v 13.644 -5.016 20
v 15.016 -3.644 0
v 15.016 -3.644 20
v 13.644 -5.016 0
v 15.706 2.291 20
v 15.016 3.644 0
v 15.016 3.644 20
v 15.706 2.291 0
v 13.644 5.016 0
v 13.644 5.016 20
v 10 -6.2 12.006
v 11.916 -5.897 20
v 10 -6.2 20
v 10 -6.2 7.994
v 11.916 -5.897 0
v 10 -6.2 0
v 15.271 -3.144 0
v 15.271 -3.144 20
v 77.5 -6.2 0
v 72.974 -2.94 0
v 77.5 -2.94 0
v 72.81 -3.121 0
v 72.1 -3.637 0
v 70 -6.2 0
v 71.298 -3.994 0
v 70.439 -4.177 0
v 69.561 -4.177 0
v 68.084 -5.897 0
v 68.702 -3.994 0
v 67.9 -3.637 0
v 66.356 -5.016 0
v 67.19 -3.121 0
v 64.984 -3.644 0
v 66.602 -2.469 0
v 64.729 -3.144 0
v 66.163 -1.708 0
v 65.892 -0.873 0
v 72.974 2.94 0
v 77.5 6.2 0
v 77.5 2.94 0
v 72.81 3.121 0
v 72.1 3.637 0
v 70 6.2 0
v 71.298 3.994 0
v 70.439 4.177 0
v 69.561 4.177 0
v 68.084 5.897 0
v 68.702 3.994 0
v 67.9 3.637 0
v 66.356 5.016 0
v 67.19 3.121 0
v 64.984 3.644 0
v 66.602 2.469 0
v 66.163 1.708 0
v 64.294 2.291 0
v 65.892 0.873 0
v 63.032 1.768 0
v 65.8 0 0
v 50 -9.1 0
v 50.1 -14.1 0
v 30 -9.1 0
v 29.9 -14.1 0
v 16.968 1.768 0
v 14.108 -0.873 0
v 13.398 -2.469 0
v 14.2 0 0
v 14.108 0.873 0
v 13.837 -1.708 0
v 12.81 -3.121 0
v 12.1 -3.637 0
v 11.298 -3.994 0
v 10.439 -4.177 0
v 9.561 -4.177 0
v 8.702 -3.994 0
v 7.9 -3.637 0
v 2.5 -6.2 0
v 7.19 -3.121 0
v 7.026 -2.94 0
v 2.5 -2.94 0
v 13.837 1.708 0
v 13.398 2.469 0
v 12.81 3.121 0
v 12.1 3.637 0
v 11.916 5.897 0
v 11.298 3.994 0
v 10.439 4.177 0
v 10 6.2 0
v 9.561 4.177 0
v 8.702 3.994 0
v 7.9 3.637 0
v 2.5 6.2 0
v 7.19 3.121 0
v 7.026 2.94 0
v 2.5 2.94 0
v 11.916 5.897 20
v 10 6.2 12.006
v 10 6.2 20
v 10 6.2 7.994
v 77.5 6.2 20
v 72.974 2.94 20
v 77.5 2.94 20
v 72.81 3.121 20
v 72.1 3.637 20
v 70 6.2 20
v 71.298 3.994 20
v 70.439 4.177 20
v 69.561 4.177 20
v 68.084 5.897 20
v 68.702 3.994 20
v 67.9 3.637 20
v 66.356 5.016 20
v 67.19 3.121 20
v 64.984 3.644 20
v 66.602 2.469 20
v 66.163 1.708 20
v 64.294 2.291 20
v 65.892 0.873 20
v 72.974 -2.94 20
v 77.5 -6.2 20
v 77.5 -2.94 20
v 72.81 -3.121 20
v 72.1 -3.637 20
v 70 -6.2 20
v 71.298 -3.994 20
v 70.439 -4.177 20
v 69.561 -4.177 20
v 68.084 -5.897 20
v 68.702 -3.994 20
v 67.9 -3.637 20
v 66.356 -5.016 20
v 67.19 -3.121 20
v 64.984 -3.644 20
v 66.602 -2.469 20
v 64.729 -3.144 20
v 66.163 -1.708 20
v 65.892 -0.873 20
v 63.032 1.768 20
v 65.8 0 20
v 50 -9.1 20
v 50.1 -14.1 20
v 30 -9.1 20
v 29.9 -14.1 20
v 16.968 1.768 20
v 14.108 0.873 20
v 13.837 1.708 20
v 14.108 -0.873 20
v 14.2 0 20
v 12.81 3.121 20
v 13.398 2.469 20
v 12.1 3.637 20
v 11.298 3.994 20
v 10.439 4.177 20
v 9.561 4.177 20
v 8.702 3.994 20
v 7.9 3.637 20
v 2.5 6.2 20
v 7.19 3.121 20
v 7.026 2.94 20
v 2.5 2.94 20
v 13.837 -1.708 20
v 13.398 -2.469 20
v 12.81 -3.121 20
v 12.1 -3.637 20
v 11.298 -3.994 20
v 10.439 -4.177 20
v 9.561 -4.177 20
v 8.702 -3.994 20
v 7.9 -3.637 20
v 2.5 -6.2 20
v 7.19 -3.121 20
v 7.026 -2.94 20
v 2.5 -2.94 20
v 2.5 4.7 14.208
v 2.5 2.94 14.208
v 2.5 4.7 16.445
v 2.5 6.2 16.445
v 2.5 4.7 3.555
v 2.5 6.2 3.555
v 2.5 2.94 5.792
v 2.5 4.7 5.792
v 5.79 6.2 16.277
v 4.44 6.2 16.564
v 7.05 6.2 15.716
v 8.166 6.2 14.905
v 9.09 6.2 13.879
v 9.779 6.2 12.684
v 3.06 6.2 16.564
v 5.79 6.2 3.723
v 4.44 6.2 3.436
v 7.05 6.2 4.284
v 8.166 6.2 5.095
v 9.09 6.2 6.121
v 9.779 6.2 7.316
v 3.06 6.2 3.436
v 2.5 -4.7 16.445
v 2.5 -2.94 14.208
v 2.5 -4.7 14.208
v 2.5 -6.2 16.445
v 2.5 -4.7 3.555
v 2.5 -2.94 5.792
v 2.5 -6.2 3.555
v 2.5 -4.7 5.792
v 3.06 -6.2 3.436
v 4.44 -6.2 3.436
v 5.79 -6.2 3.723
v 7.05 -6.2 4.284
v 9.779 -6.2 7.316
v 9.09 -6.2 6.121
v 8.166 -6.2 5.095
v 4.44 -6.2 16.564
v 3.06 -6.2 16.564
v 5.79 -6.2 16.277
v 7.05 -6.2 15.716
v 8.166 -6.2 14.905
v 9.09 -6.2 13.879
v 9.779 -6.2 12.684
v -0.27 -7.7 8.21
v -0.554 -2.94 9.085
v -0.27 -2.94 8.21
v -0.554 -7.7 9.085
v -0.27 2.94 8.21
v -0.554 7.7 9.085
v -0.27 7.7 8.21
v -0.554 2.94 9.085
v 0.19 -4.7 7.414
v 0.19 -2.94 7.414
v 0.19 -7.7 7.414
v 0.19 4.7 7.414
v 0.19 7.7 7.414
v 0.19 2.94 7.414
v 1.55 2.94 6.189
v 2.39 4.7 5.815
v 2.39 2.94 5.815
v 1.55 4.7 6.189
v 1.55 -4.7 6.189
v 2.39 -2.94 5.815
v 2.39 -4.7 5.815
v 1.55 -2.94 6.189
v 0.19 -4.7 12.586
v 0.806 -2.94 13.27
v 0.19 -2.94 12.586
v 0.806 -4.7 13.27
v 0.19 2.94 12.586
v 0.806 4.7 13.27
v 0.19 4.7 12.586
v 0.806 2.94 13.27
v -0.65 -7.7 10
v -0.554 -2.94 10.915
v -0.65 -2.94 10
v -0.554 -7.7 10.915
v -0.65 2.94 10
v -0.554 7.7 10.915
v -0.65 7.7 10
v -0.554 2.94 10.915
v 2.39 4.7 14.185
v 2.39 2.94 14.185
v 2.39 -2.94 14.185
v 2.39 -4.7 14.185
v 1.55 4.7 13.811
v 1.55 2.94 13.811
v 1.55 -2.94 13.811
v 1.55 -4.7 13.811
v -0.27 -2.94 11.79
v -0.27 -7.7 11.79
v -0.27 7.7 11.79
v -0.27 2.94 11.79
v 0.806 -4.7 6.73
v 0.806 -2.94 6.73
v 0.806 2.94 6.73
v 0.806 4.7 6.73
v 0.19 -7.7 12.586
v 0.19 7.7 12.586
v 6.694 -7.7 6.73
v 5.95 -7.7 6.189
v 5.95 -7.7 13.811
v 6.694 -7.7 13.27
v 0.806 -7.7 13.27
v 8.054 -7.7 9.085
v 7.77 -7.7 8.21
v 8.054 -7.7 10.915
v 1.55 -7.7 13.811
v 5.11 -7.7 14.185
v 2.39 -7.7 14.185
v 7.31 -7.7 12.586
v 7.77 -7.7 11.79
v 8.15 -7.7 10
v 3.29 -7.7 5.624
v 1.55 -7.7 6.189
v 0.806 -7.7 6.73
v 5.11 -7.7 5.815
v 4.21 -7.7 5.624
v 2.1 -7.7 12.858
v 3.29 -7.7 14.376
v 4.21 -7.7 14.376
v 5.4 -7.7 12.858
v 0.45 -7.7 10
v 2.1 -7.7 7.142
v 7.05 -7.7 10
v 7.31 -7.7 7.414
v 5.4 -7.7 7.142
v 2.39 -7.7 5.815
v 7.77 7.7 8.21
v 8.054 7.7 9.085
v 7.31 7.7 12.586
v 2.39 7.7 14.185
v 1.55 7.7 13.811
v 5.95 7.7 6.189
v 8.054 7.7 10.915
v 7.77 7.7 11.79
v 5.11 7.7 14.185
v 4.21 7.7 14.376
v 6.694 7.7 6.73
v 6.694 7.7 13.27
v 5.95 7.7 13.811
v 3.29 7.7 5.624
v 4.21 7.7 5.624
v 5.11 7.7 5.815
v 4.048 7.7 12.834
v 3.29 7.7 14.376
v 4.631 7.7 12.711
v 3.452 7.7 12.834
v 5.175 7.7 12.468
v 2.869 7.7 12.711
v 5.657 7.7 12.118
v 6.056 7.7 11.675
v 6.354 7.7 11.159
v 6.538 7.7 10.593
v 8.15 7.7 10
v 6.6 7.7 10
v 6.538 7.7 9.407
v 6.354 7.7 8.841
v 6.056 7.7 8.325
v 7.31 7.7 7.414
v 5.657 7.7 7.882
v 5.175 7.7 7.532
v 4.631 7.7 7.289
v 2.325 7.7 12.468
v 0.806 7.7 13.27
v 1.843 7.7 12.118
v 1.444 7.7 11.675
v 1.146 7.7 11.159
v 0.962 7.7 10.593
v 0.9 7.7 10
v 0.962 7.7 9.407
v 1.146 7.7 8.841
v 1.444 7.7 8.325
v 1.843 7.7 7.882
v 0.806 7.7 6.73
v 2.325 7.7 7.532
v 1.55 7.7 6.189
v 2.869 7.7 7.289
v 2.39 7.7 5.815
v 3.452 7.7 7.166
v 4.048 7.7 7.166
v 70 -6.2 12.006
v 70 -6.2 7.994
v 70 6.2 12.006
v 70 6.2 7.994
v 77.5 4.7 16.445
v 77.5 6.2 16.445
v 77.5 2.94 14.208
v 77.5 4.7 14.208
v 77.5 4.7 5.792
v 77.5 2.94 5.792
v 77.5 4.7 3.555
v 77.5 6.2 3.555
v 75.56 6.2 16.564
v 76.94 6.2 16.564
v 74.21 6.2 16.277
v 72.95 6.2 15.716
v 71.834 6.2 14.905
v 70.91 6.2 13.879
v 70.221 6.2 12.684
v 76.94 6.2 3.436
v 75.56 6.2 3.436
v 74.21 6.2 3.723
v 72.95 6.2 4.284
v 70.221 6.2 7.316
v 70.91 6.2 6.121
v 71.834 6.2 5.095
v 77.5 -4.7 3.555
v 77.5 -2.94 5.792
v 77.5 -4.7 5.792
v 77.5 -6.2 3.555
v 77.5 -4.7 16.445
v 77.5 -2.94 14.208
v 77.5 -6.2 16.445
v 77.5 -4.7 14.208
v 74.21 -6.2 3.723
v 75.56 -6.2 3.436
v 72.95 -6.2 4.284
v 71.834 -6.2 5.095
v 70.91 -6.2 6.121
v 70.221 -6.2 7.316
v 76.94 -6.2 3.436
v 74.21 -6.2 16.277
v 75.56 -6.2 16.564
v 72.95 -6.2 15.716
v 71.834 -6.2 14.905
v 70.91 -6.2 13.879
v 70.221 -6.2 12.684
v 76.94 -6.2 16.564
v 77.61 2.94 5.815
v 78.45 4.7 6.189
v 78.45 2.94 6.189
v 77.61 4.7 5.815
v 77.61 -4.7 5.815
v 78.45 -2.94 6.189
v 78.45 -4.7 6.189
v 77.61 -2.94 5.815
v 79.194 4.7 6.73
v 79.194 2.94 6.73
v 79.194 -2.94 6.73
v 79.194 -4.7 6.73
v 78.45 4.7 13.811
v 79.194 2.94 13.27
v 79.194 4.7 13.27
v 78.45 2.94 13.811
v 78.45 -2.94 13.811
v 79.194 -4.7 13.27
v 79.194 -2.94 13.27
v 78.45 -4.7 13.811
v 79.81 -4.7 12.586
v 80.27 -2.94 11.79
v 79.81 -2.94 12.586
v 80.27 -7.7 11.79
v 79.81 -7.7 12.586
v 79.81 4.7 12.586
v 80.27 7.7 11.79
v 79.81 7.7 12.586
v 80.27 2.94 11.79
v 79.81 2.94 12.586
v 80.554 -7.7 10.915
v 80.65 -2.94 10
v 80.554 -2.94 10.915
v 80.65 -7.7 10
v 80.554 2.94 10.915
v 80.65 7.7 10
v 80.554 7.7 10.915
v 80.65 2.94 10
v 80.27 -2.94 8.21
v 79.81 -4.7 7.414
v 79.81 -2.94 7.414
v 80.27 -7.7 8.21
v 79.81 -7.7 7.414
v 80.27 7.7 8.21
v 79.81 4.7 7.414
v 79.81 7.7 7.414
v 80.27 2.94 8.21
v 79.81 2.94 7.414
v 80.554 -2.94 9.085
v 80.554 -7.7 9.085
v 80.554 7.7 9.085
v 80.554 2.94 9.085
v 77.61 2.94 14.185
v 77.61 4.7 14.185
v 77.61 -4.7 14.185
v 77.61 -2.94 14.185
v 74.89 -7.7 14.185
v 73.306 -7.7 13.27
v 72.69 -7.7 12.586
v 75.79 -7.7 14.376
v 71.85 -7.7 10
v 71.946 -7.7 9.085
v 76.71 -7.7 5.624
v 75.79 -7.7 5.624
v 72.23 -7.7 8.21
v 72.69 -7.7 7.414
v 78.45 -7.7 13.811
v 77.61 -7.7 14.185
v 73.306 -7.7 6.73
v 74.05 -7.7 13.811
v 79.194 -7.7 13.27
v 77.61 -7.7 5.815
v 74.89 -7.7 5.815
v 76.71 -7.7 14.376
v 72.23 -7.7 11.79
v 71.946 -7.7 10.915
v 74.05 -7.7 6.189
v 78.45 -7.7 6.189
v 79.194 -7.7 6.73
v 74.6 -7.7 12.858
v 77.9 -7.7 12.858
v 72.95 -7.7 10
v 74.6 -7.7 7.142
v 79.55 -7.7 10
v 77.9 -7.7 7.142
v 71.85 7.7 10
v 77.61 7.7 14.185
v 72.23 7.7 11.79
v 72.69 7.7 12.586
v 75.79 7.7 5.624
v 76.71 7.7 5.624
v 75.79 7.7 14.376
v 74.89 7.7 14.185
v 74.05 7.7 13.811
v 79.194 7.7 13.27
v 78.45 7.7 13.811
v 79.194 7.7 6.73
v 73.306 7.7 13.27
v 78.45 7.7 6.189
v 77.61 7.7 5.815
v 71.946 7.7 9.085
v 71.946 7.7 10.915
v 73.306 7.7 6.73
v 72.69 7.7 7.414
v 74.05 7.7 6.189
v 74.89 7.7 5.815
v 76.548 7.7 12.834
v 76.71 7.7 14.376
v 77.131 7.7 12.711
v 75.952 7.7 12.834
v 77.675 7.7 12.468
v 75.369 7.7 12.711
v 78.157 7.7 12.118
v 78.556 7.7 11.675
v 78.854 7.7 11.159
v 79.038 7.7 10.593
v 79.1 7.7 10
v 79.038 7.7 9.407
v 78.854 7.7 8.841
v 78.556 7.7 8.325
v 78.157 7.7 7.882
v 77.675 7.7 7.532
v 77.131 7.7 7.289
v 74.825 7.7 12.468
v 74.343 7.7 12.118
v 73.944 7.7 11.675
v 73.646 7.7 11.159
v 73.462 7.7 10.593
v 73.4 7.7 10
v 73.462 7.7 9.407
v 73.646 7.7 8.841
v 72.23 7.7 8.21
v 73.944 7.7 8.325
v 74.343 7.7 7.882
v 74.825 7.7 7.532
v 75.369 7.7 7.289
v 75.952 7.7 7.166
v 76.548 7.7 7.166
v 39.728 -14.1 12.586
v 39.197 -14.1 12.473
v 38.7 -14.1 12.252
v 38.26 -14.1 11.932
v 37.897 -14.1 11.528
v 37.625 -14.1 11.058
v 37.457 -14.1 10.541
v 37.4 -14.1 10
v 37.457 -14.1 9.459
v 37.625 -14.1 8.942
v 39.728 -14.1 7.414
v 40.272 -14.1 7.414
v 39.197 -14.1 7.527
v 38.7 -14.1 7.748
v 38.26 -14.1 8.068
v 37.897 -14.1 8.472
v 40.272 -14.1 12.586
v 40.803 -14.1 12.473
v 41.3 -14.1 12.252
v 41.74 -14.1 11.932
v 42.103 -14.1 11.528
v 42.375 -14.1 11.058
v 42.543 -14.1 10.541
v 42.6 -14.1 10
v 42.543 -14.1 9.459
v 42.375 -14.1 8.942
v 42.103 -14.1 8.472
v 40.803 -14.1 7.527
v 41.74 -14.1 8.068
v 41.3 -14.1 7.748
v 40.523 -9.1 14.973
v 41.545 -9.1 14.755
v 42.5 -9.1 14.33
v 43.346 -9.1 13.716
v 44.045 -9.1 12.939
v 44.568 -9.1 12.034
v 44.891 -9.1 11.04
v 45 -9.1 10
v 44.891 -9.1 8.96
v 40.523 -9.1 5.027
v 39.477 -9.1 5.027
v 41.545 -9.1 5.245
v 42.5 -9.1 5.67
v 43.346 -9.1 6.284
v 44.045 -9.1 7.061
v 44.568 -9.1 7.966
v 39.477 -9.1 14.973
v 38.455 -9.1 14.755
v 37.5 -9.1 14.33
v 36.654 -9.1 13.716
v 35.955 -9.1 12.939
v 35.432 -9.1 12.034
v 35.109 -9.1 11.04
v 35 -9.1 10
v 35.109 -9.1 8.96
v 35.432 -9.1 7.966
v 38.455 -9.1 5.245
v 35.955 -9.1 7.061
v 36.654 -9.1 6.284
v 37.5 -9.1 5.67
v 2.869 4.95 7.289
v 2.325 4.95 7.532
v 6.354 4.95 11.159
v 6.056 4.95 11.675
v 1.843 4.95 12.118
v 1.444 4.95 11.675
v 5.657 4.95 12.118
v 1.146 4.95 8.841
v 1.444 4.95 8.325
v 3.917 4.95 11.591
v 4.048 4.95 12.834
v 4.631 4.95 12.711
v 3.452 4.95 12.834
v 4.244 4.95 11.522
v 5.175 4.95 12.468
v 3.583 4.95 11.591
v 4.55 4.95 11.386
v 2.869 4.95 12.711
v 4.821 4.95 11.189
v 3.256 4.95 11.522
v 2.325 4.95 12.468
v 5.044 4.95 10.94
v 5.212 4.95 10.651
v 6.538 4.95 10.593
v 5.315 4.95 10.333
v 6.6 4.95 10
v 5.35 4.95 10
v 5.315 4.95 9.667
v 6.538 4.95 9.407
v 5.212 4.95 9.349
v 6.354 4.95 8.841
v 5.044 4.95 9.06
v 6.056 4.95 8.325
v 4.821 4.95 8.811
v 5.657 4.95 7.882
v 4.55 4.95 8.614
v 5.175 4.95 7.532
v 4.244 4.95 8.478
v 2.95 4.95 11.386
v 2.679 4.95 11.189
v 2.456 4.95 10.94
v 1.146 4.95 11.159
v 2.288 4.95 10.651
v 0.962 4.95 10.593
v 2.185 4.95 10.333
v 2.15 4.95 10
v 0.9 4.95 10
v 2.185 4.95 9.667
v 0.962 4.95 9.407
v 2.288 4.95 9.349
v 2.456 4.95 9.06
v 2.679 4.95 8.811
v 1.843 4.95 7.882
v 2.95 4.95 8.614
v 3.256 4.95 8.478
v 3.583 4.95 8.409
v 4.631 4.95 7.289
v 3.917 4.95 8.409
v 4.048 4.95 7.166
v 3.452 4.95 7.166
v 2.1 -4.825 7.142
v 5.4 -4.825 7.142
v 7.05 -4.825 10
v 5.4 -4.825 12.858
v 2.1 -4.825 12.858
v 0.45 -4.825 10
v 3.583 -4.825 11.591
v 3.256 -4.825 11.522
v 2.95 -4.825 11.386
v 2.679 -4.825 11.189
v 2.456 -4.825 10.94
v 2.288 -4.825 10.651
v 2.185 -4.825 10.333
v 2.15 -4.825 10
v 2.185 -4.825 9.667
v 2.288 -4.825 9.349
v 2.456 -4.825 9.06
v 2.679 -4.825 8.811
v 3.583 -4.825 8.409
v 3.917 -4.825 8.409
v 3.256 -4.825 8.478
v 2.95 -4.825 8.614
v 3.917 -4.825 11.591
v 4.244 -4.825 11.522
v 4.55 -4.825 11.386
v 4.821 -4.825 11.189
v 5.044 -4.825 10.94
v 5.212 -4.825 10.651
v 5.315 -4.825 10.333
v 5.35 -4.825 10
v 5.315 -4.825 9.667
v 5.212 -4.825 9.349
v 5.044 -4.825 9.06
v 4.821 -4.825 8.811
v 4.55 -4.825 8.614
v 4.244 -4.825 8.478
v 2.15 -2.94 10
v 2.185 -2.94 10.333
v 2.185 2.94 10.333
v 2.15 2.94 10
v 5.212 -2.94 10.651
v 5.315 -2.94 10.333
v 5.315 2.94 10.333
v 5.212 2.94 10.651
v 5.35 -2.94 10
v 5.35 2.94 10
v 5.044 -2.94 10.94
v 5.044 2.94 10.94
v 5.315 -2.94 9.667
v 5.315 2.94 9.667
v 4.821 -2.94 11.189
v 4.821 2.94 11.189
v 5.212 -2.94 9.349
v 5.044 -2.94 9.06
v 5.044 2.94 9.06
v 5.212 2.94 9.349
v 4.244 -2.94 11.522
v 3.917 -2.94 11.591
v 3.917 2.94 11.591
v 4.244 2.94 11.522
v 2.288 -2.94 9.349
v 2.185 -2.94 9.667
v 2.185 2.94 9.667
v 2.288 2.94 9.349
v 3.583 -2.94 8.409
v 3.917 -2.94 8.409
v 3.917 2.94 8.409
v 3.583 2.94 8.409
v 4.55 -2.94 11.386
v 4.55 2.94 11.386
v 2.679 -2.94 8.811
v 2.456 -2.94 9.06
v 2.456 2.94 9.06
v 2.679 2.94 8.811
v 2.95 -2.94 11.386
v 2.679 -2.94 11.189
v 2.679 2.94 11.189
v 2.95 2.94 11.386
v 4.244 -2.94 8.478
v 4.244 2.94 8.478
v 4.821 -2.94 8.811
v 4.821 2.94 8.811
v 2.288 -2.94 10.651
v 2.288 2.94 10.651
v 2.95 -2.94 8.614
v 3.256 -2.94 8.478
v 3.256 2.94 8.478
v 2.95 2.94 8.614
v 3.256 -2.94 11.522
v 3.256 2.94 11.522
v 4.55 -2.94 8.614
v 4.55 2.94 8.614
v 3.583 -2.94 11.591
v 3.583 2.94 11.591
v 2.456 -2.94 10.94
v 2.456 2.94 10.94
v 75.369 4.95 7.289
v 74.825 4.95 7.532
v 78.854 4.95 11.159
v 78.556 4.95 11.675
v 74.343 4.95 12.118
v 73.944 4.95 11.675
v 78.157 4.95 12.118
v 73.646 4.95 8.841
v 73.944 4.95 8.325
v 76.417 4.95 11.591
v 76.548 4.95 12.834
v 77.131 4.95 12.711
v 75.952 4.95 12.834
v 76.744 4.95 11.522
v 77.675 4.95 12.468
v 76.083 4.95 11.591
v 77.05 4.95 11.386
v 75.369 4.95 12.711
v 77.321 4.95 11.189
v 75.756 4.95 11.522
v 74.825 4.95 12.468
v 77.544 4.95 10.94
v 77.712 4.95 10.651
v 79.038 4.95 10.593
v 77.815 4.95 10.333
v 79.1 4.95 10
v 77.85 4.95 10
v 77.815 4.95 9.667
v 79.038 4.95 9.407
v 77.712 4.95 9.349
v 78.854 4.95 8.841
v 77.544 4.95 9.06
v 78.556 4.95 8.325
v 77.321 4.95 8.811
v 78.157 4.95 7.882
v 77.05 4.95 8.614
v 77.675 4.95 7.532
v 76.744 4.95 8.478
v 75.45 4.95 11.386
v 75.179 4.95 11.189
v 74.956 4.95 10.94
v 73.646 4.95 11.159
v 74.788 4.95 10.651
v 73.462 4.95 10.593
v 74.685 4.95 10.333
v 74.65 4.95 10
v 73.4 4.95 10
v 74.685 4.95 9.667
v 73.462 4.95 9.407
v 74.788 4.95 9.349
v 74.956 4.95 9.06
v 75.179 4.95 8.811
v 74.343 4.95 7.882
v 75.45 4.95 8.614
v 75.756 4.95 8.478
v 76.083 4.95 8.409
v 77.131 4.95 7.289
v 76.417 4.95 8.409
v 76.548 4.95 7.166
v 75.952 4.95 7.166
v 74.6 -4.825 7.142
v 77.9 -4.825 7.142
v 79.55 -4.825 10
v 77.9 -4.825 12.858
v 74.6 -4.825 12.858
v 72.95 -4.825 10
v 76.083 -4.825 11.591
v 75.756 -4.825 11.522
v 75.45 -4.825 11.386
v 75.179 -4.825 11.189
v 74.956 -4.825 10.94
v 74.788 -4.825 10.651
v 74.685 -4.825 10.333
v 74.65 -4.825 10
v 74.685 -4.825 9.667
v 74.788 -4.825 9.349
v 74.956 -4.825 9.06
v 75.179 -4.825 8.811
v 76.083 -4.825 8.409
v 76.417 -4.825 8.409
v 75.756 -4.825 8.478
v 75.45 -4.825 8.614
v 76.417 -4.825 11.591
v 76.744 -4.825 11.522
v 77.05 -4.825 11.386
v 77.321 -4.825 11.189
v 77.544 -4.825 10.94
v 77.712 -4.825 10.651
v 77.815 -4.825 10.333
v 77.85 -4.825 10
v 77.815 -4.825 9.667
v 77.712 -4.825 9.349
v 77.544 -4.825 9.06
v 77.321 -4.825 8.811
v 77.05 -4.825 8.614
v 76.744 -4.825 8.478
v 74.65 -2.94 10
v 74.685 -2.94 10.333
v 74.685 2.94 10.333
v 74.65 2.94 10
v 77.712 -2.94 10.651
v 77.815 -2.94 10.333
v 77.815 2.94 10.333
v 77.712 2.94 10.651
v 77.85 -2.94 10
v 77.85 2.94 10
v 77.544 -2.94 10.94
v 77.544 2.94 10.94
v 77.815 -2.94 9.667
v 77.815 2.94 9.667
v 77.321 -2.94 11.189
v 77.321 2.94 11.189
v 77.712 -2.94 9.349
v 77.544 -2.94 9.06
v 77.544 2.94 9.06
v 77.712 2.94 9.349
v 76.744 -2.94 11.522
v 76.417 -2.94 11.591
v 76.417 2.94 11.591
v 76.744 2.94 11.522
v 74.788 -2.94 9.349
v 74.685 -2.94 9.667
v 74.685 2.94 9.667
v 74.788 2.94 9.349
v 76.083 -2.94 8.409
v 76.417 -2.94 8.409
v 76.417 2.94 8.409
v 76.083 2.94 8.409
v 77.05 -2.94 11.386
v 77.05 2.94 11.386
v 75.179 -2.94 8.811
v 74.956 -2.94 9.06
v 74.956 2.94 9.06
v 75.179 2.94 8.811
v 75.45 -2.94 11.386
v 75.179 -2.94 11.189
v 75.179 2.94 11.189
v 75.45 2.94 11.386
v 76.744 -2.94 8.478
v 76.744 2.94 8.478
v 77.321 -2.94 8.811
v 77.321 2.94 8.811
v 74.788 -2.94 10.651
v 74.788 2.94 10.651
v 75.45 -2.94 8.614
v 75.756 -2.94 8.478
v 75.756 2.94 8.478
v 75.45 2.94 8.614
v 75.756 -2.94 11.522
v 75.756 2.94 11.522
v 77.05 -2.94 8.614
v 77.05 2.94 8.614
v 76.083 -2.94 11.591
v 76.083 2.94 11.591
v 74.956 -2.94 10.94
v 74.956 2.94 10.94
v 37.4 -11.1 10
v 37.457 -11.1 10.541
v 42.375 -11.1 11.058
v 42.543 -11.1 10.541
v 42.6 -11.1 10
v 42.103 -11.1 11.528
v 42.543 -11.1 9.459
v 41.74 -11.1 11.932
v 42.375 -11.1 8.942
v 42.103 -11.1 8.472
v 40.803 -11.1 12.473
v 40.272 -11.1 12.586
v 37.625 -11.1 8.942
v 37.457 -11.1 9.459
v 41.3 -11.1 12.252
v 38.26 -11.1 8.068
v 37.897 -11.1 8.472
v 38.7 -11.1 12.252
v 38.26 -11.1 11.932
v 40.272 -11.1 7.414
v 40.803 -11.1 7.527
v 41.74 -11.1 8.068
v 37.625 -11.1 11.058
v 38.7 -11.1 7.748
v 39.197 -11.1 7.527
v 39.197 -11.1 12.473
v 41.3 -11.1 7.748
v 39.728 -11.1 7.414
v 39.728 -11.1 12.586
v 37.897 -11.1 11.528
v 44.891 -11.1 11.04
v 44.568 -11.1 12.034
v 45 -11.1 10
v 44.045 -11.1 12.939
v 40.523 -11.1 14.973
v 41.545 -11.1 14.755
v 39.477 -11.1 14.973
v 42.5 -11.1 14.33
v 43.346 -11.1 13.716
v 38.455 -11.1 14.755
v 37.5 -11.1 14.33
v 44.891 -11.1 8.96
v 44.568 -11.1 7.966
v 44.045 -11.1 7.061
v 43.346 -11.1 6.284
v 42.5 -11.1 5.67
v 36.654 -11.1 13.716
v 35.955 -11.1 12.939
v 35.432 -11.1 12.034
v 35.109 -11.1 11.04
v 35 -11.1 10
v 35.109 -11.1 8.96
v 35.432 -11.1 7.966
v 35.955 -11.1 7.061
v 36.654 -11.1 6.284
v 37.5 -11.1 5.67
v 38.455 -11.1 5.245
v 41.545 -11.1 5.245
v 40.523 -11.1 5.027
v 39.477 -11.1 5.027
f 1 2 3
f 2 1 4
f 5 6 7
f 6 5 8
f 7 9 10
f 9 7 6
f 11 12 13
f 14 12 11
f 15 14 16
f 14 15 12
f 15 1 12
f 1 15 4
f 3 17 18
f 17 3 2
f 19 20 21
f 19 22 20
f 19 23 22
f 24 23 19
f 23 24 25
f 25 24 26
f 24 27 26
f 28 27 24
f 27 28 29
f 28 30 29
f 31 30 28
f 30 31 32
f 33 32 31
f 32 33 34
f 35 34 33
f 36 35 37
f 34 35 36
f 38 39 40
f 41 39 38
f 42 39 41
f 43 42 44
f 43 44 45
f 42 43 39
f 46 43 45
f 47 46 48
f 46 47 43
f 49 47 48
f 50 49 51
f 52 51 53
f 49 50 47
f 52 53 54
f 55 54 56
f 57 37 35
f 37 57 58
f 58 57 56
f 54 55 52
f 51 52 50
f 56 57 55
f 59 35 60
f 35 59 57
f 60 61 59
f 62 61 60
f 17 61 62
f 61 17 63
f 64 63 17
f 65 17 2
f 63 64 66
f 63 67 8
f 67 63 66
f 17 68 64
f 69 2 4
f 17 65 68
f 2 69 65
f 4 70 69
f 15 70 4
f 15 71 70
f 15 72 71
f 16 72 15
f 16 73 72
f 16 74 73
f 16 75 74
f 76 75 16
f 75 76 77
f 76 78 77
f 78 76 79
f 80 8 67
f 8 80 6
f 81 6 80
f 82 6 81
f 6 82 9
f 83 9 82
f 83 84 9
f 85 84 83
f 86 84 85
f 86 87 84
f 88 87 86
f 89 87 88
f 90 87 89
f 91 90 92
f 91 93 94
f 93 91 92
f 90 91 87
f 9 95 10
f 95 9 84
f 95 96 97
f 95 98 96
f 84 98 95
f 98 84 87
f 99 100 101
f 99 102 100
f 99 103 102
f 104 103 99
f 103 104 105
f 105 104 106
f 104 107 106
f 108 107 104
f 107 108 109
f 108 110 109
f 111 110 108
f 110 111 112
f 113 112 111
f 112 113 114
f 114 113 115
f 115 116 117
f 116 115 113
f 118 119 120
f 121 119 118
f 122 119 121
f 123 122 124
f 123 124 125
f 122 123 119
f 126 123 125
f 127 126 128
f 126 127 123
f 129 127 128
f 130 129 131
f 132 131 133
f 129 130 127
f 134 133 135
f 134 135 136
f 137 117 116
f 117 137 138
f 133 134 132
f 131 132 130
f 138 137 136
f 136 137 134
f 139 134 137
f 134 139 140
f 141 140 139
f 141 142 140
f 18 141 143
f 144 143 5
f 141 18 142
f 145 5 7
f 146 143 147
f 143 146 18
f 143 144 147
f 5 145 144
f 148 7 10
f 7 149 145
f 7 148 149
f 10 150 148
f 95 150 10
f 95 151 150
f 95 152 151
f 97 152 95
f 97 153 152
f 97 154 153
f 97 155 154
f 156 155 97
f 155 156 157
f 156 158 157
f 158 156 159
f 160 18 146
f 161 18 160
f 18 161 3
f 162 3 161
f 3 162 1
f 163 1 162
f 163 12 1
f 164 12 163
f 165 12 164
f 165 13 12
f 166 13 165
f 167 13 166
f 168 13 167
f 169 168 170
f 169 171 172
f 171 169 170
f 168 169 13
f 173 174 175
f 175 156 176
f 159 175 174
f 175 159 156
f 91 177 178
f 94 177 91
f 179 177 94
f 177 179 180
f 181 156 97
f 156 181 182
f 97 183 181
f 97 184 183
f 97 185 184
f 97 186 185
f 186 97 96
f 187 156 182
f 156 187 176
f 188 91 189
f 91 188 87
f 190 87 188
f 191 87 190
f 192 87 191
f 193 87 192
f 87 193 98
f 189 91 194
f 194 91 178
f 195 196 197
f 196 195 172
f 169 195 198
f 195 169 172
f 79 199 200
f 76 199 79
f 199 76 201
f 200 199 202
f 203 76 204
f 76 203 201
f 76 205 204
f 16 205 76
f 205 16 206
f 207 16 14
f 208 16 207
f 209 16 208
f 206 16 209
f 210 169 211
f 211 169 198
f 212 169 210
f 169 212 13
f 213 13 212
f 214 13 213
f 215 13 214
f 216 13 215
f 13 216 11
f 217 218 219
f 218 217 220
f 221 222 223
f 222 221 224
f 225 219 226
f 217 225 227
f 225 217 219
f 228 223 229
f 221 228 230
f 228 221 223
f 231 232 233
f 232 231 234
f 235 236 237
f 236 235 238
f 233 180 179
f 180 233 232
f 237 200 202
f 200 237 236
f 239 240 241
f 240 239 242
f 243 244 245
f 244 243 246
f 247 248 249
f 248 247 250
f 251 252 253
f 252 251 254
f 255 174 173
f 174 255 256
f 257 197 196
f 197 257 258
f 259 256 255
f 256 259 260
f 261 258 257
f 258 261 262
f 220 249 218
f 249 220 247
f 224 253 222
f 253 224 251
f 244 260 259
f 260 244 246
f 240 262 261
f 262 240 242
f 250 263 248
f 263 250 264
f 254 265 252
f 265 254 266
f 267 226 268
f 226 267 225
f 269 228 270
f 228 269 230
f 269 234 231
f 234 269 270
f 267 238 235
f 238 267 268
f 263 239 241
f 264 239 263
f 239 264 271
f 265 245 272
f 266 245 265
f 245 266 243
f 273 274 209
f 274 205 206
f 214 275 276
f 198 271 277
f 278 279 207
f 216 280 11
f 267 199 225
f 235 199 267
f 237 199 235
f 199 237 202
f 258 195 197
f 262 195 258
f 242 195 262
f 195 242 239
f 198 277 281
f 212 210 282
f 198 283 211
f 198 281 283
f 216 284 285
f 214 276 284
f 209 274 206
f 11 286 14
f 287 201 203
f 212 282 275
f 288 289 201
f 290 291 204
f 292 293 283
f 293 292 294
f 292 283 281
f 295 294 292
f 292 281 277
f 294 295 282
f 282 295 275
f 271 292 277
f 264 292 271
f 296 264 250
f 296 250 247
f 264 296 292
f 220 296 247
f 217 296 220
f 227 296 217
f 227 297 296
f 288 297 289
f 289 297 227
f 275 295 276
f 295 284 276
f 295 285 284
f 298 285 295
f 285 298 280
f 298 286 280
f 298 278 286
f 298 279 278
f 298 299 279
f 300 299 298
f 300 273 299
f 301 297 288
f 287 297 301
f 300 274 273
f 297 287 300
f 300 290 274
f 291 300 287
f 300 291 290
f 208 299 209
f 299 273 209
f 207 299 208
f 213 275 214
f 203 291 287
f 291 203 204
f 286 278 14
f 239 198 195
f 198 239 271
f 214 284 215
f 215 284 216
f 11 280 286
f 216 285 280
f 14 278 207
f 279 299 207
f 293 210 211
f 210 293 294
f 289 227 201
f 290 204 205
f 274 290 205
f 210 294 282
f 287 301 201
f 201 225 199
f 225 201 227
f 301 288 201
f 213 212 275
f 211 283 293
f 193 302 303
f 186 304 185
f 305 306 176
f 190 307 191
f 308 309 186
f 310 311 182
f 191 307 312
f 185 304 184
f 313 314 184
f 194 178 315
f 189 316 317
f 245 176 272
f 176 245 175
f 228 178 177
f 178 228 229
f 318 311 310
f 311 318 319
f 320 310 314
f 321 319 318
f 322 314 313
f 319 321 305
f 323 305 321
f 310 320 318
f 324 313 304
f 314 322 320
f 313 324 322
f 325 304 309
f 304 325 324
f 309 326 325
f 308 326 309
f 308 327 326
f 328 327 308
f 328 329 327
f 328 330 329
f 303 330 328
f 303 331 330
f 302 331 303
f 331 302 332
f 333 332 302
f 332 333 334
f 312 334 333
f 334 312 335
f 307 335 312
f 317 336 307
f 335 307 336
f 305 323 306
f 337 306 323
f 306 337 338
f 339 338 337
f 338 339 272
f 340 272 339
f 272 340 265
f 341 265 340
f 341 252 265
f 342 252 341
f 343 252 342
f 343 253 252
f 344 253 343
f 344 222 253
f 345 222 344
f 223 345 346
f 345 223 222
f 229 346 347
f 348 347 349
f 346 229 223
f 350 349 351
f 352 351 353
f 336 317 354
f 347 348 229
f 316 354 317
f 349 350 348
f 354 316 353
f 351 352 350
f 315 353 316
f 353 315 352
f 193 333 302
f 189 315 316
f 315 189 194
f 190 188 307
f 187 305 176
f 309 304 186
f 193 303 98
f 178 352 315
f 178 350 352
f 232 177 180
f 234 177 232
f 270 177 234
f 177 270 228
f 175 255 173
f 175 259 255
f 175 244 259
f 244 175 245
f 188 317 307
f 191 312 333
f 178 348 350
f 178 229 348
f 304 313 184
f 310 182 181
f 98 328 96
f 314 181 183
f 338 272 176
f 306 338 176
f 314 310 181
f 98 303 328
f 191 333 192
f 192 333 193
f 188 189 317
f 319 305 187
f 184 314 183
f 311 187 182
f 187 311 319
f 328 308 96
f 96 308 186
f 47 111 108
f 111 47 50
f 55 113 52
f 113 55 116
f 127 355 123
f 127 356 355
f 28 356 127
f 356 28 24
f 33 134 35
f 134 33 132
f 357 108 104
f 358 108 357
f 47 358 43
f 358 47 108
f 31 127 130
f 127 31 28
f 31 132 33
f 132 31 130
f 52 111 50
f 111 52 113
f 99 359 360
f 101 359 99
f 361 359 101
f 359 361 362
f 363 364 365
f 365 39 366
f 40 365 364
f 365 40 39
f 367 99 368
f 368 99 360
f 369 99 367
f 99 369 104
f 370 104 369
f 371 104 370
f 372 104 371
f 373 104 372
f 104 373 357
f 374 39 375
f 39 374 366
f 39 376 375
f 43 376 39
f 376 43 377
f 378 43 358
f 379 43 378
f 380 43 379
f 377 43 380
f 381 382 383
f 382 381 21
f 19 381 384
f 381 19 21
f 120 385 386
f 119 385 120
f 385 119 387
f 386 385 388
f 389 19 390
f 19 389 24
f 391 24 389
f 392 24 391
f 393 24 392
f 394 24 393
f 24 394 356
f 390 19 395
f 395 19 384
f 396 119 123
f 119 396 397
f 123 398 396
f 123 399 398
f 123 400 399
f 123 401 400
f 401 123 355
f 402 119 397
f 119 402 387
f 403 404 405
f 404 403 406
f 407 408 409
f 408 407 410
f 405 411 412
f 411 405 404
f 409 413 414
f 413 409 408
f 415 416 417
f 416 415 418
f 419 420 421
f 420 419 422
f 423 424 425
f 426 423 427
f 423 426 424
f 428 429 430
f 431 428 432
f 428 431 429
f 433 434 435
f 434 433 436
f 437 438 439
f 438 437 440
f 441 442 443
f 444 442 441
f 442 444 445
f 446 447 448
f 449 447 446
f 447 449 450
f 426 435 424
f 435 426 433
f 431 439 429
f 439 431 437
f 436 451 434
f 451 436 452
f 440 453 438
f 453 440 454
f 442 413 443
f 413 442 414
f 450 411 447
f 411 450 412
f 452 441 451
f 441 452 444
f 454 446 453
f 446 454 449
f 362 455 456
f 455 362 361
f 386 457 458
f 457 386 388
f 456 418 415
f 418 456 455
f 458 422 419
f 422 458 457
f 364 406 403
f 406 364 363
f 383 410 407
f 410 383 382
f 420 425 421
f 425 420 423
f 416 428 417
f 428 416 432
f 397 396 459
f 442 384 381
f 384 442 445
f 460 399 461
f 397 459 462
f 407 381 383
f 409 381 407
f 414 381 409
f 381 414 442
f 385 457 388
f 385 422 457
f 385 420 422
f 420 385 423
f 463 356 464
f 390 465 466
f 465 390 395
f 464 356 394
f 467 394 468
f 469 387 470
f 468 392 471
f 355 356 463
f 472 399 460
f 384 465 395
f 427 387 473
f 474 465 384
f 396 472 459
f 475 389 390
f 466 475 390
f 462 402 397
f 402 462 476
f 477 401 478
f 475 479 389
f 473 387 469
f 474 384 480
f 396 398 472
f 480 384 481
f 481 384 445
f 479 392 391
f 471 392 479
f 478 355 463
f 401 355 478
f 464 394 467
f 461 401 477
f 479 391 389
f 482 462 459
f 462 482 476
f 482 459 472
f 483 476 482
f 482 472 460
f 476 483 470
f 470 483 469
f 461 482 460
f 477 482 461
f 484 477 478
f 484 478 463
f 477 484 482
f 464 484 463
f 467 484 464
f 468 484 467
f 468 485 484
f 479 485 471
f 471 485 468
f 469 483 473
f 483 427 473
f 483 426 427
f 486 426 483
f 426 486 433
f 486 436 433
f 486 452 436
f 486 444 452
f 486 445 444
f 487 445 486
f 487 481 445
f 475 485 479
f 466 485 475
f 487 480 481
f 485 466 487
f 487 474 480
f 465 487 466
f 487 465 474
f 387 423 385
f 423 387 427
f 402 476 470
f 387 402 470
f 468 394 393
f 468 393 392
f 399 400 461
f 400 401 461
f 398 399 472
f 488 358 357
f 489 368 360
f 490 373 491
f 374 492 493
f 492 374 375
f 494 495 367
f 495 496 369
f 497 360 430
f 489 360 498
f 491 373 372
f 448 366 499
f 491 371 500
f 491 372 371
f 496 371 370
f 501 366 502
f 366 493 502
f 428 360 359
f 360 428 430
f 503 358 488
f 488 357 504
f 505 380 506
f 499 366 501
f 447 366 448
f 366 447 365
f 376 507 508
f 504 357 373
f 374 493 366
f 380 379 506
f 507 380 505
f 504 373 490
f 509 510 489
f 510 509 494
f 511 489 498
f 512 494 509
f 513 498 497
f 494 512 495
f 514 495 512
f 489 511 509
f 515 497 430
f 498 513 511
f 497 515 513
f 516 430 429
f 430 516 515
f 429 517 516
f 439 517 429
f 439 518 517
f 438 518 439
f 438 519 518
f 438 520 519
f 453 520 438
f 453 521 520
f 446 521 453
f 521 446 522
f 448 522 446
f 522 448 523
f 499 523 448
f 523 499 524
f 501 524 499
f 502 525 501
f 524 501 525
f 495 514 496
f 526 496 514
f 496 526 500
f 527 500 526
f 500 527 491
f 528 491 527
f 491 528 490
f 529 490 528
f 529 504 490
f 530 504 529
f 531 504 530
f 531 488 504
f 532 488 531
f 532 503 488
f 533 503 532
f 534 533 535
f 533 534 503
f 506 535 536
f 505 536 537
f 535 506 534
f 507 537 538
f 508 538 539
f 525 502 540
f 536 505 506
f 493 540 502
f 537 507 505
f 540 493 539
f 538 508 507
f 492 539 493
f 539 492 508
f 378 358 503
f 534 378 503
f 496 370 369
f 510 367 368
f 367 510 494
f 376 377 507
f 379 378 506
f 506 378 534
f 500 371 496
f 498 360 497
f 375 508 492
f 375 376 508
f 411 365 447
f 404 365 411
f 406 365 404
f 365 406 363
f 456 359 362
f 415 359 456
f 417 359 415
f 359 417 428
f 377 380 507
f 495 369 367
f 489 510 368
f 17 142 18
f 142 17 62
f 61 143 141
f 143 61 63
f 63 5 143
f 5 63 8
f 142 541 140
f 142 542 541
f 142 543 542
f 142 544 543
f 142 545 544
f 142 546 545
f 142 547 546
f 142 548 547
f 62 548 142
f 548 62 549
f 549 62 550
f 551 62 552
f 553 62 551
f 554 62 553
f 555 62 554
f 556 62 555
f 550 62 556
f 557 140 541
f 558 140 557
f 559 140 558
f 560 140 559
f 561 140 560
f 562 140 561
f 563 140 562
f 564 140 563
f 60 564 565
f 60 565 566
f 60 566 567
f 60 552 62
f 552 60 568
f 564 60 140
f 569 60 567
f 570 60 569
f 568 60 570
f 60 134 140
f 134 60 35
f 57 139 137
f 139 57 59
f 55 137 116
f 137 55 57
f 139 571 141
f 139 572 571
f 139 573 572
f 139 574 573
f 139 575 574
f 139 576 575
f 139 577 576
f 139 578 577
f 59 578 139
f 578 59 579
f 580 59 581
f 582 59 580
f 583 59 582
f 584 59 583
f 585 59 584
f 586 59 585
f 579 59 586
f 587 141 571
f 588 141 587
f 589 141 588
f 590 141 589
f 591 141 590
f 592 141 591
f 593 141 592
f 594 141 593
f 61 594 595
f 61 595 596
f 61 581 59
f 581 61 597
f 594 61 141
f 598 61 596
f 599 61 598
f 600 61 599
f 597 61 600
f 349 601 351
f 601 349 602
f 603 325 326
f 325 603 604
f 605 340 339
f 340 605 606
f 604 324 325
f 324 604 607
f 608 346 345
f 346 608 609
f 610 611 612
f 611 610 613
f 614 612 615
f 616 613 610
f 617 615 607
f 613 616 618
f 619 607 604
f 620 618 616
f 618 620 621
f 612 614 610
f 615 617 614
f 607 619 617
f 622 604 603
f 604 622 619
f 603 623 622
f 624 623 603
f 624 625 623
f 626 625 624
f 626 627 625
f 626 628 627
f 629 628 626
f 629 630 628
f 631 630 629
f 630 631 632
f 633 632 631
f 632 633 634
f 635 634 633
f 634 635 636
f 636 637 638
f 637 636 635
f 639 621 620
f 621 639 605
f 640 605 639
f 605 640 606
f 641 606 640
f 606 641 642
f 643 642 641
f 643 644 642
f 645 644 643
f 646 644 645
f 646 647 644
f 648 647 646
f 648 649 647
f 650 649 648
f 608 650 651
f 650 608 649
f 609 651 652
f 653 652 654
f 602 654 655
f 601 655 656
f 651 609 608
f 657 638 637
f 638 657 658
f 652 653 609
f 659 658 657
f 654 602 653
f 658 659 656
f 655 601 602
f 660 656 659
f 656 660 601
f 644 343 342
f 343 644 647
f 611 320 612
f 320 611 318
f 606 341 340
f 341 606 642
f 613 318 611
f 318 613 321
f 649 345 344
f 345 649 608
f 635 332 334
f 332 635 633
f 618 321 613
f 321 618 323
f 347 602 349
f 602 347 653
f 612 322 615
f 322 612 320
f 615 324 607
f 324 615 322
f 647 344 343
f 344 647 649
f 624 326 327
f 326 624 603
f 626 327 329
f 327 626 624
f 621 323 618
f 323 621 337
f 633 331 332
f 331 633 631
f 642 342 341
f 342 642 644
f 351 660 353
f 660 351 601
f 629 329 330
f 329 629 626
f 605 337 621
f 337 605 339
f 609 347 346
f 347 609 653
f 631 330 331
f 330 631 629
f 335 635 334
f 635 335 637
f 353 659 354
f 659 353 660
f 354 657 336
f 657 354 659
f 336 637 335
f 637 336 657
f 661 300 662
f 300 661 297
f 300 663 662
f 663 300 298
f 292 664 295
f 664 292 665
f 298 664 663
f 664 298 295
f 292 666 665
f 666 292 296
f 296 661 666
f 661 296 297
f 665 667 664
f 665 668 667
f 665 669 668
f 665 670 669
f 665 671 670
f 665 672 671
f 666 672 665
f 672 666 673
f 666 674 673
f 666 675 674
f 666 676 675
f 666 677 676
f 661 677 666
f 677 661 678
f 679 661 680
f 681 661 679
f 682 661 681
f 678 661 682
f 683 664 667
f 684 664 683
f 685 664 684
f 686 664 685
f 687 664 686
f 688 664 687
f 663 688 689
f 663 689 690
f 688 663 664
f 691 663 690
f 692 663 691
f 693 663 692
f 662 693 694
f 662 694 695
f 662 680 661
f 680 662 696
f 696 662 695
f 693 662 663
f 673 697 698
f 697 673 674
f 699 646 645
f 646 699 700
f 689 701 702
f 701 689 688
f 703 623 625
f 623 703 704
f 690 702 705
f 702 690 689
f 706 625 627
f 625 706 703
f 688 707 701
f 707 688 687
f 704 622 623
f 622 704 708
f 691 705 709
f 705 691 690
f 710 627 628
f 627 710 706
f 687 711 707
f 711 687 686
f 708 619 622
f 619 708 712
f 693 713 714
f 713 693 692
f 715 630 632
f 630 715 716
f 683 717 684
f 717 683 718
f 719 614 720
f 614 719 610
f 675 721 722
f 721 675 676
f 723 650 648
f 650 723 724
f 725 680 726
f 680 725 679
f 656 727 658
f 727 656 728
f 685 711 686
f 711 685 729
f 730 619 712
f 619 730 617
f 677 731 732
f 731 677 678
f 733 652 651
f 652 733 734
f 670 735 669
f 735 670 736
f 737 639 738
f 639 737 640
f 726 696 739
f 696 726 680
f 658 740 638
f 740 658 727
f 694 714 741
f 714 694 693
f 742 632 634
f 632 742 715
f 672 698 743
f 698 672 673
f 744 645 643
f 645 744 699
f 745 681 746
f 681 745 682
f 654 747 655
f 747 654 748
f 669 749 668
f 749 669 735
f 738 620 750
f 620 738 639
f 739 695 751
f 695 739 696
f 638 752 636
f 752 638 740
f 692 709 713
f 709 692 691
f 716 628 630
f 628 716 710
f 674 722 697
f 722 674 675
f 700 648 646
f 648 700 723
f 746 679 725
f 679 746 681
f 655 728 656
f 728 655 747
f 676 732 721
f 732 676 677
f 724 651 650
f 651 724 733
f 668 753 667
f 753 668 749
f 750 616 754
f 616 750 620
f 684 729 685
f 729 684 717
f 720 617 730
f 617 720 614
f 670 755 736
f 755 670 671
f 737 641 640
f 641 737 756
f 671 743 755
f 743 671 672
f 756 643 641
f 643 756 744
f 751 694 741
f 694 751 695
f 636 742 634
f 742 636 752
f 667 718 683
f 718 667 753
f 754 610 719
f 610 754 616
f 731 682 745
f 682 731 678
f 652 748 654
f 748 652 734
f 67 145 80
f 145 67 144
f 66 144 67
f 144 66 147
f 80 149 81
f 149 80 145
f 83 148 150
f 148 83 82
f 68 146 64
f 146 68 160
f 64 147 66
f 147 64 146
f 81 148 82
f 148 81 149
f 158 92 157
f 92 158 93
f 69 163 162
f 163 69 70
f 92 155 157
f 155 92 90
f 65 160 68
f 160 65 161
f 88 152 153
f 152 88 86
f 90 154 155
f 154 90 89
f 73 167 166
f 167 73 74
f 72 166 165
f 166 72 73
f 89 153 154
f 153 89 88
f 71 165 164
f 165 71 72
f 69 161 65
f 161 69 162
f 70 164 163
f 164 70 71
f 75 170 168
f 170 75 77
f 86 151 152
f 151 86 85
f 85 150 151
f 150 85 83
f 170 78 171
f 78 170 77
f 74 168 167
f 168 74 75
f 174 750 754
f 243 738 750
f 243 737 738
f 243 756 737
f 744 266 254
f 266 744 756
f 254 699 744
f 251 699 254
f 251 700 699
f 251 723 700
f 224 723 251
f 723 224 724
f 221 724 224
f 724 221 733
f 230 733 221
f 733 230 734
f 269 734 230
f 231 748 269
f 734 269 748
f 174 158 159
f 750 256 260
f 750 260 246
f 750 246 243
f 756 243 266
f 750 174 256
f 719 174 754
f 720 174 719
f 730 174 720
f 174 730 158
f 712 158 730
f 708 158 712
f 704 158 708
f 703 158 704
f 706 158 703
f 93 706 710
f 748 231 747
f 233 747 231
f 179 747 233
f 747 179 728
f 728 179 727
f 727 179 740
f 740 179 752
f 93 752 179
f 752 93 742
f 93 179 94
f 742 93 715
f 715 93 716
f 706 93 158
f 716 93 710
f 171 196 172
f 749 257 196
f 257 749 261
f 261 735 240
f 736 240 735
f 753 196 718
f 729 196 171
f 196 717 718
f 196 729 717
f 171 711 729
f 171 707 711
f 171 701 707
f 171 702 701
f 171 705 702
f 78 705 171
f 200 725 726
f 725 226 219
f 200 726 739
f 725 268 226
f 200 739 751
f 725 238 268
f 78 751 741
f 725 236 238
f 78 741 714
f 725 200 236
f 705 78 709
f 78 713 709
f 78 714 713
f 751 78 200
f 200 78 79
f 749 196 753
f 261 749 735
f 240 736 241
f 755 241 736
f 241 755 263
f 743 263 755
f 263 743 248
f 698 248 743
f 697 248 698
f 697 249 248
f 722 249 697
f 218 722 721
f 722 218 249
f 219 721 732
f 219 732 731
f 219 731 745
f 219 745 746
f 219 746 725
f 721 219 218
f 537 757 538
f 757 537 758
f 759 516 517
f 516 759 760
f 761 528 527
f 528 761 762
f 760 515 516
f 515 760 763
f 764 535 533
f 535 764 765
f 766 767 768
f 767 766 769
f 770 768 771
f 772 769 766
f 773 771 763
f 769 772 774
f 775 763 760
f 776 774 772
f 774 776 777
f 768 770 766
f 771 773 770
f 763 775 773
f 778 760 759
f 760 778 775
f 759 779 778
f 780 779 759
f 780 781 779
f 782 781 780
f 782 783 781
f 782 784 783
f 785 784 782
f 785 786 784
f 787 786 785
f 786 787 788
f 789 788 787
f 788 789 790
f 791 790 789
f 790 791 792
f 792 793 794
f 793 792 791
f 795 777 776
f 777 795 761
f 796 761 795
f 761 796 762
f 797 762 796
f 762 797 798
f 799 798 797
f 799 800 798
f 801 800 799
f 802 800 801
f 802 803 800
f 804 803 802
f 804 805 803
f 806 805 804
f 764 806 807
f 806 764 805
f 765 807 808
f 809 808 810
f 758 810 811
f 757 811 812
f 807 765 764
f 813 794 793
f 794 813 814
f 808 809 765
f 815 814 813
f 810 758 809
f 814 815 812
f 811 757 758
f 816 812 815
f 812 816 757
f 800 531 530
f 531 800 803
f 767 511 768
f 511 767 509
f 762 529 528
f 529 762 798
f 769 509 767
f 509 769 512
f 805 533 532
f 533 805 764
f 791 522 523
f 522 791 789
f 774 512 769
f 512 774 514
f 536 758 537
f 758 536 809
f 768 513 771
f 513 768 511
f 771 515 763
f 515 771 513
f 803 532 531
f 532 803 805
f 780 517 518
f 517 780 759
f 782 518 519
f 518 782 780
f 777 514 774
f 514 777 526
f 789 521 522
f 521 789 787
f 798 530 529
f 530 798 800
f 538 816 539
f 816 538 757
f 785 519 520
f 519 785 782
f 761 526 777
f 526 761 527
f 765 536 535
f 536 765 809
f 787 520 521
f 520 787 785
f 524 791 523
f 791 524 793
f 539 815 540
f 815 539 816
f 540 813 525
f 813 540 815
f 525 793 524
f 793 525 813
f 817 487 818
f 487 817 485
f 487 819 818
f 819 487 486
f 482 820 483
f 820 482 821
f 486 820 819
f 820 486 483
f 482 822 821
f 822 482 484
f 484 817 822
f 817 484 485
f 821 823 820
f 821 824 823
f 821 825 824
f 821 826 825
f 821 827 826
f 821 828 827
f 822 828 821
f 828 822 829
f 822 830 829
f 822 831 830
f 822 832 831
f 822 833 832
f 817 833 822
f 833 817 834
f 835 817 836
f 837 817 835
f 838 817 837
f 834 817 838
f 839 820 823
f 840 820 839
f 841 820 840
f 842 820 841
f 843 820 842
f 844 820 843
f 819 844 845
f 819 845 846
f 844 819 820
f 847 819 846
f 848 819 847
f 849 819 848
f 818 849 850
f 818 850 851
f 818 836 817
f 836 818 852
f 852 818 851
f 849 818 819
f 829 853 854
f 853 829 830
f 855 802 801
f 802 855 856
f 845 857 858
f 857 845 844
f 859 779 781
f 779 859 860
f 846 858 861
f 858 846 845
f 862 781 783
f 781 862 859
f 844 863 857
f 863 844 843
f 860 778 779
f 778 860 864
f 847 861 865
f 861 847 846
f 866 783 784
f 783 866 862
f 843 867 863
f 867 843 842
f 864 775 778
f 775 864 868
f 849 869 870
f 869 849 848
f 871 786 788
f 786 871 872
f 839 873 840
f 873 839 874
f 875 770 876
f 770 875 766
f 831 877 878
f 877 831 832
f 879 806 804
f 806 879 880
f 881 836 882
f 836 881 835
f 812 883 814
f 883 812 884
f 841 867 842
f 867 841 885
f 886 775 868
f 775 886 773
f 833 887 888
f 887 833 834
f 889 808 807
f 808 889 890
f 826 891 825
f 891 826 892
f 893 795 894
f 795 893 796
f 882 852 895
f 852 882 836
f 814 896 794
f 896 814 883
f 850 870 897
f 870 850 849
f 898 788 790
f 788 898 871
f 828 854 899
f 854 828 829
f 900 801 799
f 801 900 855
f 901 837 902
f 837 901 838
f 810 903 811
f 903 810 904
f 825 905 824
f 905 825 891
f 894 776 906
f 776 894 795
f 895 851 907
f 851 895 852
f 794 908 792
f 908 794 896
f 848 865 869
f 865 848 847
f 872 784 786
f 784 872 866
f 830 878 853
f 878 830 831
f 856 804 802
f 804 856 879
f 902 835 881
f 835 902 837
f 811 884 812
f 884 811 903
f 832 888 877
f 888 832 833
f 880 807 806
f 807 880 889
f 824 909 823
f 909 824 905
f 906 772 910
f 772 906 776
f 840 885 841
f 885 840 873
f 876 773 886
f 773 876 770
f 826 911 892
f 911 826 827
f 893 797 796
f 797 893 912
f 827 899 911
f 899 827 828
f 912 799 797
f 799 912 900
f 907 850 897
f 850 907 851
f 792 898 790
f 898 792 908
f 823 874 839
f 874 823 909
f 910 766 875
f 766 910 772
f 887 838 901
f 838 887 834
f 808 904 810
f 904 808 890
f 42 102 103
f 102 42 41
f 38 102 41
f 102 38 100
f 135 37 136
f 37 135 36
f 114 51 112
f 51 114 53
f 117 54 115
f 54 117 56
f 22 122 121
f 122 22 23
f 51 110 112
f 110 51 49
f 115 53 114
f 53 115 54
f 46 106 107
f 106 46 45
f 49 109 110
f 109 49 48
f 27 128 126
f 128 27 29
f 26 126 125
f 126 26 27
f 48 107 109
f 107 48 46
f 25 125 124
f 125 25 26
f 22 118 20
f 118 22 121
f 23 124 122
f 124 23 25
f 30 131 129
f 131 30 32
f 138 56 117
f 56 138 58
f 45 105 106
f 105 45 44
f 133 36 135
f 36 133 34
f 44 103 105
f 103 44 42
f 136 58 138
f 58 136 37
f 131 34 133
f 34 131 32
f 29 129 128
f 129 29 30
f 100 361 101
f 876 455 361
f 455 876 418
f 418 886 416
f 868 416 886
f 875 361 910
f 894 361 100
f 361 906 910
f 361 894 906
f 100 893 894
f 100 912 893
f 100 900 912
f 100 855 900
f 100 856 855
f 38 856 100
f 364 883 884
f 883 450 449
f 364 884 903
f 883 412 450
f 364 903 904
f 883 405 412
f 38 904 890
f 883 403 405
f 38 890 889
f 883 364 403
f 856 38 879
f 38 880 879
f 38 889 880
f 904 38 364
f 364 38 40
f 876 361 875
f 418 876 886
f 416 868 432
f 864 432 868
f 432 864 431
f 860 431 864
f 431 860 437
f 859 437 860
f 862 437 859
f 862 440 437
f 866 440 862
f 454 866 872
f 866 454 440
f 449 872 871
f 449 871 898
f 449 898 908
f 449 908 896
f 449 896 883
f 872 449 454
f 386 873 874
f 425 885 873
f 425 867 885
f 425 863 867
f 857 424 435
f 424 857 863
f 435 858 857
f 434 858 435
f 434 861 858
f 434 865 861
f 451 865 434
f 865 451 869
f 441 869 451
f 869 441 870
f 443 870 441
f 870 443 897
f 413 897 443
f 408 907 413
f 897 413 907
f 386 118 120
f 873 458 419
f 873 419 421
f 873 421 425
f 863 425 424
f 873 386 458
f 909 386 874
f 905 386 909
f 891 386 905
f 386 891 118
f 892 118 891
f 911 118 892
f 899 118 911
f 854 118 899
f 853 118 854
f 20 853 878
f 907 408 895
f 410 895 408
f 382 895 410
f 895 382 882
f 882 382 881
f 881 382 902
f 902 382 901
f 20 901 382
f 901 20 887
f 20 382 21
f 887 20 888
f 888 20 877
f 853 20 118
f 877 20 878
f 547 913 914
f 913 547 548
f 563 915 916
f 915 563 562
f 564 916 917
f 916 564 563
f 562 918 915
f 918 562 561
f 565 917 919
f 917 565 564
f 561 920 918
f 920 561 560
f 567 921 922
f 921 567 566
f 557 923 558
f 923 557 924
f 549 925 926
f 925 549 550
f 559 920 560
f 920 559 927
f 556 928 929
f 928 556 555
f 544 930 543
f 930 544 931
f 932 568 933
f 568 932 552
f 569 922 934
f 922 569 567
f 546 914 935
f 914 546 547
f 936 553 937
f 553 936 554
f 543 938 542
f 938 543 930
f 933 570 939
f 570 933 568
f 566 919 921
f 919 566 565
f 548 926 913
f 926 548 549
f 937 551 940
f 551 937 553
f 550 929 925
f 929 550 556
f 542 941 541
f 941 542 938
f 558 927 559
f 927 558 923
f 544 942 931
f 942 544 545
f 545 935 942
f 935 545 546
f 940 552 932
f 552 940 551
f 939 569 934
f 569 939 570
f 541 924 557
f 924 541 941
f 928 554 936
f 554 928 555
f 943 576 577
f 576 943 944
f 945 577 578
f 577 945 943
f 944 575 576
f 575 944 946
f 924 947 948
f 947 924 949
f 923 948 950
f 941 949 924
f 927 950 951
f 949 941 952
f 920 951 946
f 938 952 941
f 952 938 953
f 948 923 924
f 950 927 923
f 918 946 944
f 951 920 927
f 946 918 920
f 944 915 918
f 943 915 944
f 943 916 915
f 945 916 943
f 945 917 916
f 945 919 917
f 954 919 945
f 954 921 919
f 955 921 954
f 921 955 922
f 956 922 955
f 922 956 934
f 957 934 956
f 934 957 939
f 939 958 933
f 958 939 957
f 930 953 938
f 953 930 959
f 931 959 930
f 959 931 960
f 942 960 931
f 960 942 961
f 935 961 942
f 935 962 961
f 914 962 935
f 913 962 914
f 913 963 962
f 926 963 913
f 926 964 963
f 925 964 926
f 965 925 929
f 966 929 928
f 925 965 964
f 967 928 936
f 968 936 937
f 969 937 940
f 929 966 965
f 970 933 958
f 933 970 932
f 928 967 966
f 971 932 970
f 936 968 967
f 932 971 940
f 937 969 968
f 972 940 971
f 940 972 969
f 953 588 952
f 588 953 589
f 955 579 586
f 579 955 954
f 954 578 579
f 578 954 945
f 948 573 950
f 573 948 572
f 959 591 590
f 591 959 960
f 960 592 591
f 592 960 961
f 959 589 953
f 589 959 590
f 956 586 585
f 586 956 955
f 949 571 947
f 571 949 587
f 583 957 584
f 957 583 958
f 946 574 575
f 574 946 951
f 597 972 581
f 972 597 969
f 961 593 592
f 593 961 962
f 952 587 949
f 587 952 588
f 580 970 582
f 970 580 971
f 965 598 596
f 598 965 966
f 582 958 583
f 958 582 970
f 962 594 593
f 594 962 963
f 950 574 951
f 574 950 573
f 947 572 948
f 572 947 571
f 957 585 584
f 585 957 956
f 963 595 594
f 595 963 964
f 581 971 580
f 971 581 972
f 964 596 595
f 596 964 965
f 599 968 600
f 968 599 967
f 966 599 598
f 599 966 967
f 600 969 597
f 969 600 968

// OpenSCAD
m3_diameter = 3.2 ;
m3_head_diameter = 5.7 ;
m3_head_thickness = 3.0 ;
m3_nut_diameter = 6.6 ;
m3_nut_thickness = 2.5 ;
m3_tap_diameter = 2.5 ;

m5_diameter = 5.2;
m5_cap_length = 5;
m5_nut_diameter = 9.4;
m5_washer_diameter = 10;
m5_nut_thickness = 2.7;
m5_tap_diameter = 4.3;


rod_dia = 8.4 ;
thickness = 2 ;
length = 20 ;

module carriage(useEndstop) {
	difference() {
		union() {
			for( i=[-1,1] ){
				translate([i*30, 0,0]) {
					cylinder( r = rod_dia/2+thickness, h = length );
					translate([i*(rod_dia/2+m3_nut_diameter/2)/2, (rod_dia/2+thickness)-(rod_dia*0.4)/2,length/2]) cube([rod_dia/2+m3_nut_diameter/2,rod_dia*0.4,length],center=true);
					translate([i*(rod_dia/2+m3_nut_diameter/2)/2,-(rod_dia/2+thickness)+(rod_dia*0.4)/2,length/2]) cube([rod_dia/2+m3_nut_diameter/2,rod_dia*0.4,length],center=true);
					
					translate([i*(rod_dia/2.4+m3_nut_diameter/2.4),0,length/2]) rotate([90,0,0]) cylinder( r = m3_nut_diameter/1.5, h=  rod_dia+thickness*2, center = true, $fn=30);
		
		
					hull(){
						intersection() {
							translate([i*(rod_dia/2.4+m3_nut_diameter/2.4),0,length/2]) rotate([90,0,0]) translate([0,0,(rod_dia+thickness*2)/2])
								cylinder( r = m3_nut_diameter, h=  m3_head_thickness, center = true, $fn=30);
				
							translate([i*(rod_dia/2+m3_nut_diameter/2)/2,-(rod_dia/2+thickness)+(rod_dia*0.4)/2,length/2]) cube([rod_dia/2+m3_nut_diameter/2,rod_dia*0.4,length],center=true);
						}
						translate([i*(rod_dia/2.4+m3_nut_diameter/2.4),0,length/2]) rotate([90,0,0]) translate([0,0,(rod_dia+thickness*2)/2])
							cylinder( r = m3_nut_diameter/1.5, h=  m3_head_thickness, center = true, $fn=30);
					}
					hull(){
						intersection() {
							translate([i*(rod_dia/2.4+m3_nut_diameter/2.4),0,length/2]) rotate([90,0,0]) translate([0,0,-(rod_dia+thickness*2)/2])
								cylinder( r = m3_nut_diameter, h=  m3_head_thickness, center = true, $fn=30);
								
							translate([i*(rod_dia/2+m3_nut_diameter/2)/2, (rod_dia/2+thickness)-(rod_dia*0.4)/2,length/2]) cube([rod_dia/2+m3_nut_diameter/2,rod_dia*0.4,length],center=true);
						}
						translate([i*(rod_dia/2.4+m3_nut_diameter/2.4),0,length/2]) rotate([90,0,0]) translate([0,0,-(rod_dia+thickness*2)/2])
							cylinder( r = m3_nut_diameter/1.5, h=  m3_head_thickness, center = true, $fn=30);
					}
				}
			}
			translate([0,-11.6,length/2]) {
				cube([length,5,length],center=true);
				for( i=[-1,1] ) hull() {
					translate([i*(length+0.1)/2,0,0]) cube([0.1,5,length], center=true);
					
					translate([i*(30-rod_dia/2-thickness/2),11.6,-length/2]) {
						cylinder( r = thickness*1.25, h = length );
					}
				}
			}
			if( useEndstop) {
				translate([13,9,length/2]) {
					cube([18,5,length],center=true);
				}
				hull() {
					translate([22,8,length/2]) {
						cube([thickness,5,length],center=true);
					}
					translate([-(-30+rod_dia/2+thickness/2),0,0]) {
						cylinder( r = thickness*1.25, h = length );
					}
				}
			}
		}
		union() {
			for( i=[-1,1] ){
				translate([i*30, 0, -0.1]) {
					cylinder( r = rod_dia/2, h = length*2,$fn=30 );
					translate([i*rod_dia,0,length/2-0.1]) cube([rod_dia*2,rod_dia*.7,length*2],center=true);
					translate([i*(rod_dia/2.4+m3_nut_diameter/2.4),0,length/2+0.1]) rotate([90,0,0]) {
						rotate([0,180,0]) translate([0,0,(rod_dia+m3_head_thickness*1.5)/2]) cylinder( r = m3_head_diameter/2, h=  m3_head_thickness, center = true, $fn = 30);
						translate([0,0,(rod_dia+m3_nut_thickness*2.5)/2]) cylinder( r = m3_nut_diameter/2, h=  m3_nut_thickness*2, center = true, $fn = 6);
						cylinder( r = m3_diameter/2, h=  (rod_dia+thickness*2)*2, center = true, $fn = 30);
					}
				}
			}
			translate([0,-11.6,length/2]) rotate([90,0,0]){
				cylinder( r = m5_diameter/2, h = 10, center =true,$fn=30);
				translate([0,0,-3]) cylinder( r = m5_washer_diameter/2, h = 5, center =true,$fn=30);
			}
			
			if( true ) { 
				if( useEndstop) translate([16.5,11.1,length/2]) {
					cube([17,1,length+0.2],center=true);
					translate([0.5,-0.45,length/2-0.25]) minkowski() {
						cube([17,1,3.6],center=true);
						rotate([0,90,0]) cylinder( r = 0.5, h = 1, $fn = 10, center=true );
					}
					rotate([90,0,0]) translate([-1,0,-1]) cylinder(r=m3_diameter/2, h=10,center=false,$fn=30);
					rotate([90,0,0]) translate([-1,0,4]) cylinder(r=m3_nut_diameter/2, h=m3_nut_thickness,center=true,$fn=6);
				}
			}
			else {
				if( useEndstop) translate([15.5,11.1,length/2]) {
					cube([15,1,length+0.2],center=true);
					translate([0,-0.95,length/2-1]) cube([15,1,2.6],center=true);
					rotate([90,0,0]) translate([0,0,-1]) cylinder(r=m3_diameter/2, h=10,center=false,$fn=30);
					rotate([90,0,0]) translate([0,0,4]) cylinder(r=m3_nut_diameter/2, h=m3_nut_thickness,center=true,$fn=6);
				}
			}
		}
	}
}

//color("blue") rotate([0,0,180]) translate([-40,-20,-20]) import("carriage-slim_holder_double.stl");
//color("blue")rotate([0,0,60]) translate([-42,-37,-50])  import("Kossel_Alt_-_20mm_extrusion_-_8mm_smooth_rods/Kossel_Rav_Alt_bottom_frame_20mm_V3(centered).stl");
//
/*
translate([-45,0,0]){
	translate([0,-15,0])
		carriage(false);
	translate([0,0,0])
		carriage(false);
	translate([0,15,0])
		carriage(false);
}*/
translate([40,0,0]){
	//translate([0,-27,0])
	//	carriage(true);
	translate([0,0,0])
		carriage(false);
//	translate([0,27,0])
	//	carriage(true);
}
